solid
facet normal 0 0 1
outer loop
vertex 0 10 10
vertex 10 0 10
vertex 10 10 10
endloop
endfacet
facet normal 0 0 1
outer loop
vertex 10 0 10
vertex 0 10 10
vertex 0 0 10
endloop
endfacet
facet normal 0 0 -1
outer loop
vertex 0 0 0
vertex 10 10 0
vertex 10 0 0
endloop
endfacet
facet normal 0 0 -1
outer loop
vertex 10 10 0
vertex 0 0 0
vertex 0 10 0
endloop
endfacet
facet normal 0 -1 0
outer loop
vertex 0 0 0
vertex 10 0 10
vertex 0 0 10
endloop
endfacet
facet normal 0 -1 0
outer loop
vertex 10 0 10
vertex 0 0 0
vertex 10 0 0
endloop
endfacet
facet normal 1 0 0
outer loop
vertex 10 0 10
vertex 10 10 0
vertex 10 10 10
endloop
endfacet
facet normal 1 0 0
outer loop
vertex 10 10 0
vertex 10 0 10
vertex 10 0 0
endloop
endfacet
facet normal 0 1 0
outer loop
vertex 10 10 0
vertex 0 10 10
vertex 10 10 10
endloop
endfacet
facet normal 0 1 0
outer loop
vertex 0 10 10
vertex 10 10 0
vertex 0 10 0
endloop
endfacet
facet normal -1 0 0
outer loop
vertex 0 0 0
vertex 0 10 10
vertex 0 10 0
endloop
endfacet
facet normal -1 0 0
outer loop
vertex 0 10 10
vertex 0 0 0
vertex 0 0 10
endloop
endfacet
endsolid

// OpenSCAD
// Failure class 1: trailing semicolon after translate modifier
// The semicolon terminates the modifier, leaving the cube at the origin
// instead of being translated.
translate([10, 20, 30]);
cube([10, 10, 10]);
